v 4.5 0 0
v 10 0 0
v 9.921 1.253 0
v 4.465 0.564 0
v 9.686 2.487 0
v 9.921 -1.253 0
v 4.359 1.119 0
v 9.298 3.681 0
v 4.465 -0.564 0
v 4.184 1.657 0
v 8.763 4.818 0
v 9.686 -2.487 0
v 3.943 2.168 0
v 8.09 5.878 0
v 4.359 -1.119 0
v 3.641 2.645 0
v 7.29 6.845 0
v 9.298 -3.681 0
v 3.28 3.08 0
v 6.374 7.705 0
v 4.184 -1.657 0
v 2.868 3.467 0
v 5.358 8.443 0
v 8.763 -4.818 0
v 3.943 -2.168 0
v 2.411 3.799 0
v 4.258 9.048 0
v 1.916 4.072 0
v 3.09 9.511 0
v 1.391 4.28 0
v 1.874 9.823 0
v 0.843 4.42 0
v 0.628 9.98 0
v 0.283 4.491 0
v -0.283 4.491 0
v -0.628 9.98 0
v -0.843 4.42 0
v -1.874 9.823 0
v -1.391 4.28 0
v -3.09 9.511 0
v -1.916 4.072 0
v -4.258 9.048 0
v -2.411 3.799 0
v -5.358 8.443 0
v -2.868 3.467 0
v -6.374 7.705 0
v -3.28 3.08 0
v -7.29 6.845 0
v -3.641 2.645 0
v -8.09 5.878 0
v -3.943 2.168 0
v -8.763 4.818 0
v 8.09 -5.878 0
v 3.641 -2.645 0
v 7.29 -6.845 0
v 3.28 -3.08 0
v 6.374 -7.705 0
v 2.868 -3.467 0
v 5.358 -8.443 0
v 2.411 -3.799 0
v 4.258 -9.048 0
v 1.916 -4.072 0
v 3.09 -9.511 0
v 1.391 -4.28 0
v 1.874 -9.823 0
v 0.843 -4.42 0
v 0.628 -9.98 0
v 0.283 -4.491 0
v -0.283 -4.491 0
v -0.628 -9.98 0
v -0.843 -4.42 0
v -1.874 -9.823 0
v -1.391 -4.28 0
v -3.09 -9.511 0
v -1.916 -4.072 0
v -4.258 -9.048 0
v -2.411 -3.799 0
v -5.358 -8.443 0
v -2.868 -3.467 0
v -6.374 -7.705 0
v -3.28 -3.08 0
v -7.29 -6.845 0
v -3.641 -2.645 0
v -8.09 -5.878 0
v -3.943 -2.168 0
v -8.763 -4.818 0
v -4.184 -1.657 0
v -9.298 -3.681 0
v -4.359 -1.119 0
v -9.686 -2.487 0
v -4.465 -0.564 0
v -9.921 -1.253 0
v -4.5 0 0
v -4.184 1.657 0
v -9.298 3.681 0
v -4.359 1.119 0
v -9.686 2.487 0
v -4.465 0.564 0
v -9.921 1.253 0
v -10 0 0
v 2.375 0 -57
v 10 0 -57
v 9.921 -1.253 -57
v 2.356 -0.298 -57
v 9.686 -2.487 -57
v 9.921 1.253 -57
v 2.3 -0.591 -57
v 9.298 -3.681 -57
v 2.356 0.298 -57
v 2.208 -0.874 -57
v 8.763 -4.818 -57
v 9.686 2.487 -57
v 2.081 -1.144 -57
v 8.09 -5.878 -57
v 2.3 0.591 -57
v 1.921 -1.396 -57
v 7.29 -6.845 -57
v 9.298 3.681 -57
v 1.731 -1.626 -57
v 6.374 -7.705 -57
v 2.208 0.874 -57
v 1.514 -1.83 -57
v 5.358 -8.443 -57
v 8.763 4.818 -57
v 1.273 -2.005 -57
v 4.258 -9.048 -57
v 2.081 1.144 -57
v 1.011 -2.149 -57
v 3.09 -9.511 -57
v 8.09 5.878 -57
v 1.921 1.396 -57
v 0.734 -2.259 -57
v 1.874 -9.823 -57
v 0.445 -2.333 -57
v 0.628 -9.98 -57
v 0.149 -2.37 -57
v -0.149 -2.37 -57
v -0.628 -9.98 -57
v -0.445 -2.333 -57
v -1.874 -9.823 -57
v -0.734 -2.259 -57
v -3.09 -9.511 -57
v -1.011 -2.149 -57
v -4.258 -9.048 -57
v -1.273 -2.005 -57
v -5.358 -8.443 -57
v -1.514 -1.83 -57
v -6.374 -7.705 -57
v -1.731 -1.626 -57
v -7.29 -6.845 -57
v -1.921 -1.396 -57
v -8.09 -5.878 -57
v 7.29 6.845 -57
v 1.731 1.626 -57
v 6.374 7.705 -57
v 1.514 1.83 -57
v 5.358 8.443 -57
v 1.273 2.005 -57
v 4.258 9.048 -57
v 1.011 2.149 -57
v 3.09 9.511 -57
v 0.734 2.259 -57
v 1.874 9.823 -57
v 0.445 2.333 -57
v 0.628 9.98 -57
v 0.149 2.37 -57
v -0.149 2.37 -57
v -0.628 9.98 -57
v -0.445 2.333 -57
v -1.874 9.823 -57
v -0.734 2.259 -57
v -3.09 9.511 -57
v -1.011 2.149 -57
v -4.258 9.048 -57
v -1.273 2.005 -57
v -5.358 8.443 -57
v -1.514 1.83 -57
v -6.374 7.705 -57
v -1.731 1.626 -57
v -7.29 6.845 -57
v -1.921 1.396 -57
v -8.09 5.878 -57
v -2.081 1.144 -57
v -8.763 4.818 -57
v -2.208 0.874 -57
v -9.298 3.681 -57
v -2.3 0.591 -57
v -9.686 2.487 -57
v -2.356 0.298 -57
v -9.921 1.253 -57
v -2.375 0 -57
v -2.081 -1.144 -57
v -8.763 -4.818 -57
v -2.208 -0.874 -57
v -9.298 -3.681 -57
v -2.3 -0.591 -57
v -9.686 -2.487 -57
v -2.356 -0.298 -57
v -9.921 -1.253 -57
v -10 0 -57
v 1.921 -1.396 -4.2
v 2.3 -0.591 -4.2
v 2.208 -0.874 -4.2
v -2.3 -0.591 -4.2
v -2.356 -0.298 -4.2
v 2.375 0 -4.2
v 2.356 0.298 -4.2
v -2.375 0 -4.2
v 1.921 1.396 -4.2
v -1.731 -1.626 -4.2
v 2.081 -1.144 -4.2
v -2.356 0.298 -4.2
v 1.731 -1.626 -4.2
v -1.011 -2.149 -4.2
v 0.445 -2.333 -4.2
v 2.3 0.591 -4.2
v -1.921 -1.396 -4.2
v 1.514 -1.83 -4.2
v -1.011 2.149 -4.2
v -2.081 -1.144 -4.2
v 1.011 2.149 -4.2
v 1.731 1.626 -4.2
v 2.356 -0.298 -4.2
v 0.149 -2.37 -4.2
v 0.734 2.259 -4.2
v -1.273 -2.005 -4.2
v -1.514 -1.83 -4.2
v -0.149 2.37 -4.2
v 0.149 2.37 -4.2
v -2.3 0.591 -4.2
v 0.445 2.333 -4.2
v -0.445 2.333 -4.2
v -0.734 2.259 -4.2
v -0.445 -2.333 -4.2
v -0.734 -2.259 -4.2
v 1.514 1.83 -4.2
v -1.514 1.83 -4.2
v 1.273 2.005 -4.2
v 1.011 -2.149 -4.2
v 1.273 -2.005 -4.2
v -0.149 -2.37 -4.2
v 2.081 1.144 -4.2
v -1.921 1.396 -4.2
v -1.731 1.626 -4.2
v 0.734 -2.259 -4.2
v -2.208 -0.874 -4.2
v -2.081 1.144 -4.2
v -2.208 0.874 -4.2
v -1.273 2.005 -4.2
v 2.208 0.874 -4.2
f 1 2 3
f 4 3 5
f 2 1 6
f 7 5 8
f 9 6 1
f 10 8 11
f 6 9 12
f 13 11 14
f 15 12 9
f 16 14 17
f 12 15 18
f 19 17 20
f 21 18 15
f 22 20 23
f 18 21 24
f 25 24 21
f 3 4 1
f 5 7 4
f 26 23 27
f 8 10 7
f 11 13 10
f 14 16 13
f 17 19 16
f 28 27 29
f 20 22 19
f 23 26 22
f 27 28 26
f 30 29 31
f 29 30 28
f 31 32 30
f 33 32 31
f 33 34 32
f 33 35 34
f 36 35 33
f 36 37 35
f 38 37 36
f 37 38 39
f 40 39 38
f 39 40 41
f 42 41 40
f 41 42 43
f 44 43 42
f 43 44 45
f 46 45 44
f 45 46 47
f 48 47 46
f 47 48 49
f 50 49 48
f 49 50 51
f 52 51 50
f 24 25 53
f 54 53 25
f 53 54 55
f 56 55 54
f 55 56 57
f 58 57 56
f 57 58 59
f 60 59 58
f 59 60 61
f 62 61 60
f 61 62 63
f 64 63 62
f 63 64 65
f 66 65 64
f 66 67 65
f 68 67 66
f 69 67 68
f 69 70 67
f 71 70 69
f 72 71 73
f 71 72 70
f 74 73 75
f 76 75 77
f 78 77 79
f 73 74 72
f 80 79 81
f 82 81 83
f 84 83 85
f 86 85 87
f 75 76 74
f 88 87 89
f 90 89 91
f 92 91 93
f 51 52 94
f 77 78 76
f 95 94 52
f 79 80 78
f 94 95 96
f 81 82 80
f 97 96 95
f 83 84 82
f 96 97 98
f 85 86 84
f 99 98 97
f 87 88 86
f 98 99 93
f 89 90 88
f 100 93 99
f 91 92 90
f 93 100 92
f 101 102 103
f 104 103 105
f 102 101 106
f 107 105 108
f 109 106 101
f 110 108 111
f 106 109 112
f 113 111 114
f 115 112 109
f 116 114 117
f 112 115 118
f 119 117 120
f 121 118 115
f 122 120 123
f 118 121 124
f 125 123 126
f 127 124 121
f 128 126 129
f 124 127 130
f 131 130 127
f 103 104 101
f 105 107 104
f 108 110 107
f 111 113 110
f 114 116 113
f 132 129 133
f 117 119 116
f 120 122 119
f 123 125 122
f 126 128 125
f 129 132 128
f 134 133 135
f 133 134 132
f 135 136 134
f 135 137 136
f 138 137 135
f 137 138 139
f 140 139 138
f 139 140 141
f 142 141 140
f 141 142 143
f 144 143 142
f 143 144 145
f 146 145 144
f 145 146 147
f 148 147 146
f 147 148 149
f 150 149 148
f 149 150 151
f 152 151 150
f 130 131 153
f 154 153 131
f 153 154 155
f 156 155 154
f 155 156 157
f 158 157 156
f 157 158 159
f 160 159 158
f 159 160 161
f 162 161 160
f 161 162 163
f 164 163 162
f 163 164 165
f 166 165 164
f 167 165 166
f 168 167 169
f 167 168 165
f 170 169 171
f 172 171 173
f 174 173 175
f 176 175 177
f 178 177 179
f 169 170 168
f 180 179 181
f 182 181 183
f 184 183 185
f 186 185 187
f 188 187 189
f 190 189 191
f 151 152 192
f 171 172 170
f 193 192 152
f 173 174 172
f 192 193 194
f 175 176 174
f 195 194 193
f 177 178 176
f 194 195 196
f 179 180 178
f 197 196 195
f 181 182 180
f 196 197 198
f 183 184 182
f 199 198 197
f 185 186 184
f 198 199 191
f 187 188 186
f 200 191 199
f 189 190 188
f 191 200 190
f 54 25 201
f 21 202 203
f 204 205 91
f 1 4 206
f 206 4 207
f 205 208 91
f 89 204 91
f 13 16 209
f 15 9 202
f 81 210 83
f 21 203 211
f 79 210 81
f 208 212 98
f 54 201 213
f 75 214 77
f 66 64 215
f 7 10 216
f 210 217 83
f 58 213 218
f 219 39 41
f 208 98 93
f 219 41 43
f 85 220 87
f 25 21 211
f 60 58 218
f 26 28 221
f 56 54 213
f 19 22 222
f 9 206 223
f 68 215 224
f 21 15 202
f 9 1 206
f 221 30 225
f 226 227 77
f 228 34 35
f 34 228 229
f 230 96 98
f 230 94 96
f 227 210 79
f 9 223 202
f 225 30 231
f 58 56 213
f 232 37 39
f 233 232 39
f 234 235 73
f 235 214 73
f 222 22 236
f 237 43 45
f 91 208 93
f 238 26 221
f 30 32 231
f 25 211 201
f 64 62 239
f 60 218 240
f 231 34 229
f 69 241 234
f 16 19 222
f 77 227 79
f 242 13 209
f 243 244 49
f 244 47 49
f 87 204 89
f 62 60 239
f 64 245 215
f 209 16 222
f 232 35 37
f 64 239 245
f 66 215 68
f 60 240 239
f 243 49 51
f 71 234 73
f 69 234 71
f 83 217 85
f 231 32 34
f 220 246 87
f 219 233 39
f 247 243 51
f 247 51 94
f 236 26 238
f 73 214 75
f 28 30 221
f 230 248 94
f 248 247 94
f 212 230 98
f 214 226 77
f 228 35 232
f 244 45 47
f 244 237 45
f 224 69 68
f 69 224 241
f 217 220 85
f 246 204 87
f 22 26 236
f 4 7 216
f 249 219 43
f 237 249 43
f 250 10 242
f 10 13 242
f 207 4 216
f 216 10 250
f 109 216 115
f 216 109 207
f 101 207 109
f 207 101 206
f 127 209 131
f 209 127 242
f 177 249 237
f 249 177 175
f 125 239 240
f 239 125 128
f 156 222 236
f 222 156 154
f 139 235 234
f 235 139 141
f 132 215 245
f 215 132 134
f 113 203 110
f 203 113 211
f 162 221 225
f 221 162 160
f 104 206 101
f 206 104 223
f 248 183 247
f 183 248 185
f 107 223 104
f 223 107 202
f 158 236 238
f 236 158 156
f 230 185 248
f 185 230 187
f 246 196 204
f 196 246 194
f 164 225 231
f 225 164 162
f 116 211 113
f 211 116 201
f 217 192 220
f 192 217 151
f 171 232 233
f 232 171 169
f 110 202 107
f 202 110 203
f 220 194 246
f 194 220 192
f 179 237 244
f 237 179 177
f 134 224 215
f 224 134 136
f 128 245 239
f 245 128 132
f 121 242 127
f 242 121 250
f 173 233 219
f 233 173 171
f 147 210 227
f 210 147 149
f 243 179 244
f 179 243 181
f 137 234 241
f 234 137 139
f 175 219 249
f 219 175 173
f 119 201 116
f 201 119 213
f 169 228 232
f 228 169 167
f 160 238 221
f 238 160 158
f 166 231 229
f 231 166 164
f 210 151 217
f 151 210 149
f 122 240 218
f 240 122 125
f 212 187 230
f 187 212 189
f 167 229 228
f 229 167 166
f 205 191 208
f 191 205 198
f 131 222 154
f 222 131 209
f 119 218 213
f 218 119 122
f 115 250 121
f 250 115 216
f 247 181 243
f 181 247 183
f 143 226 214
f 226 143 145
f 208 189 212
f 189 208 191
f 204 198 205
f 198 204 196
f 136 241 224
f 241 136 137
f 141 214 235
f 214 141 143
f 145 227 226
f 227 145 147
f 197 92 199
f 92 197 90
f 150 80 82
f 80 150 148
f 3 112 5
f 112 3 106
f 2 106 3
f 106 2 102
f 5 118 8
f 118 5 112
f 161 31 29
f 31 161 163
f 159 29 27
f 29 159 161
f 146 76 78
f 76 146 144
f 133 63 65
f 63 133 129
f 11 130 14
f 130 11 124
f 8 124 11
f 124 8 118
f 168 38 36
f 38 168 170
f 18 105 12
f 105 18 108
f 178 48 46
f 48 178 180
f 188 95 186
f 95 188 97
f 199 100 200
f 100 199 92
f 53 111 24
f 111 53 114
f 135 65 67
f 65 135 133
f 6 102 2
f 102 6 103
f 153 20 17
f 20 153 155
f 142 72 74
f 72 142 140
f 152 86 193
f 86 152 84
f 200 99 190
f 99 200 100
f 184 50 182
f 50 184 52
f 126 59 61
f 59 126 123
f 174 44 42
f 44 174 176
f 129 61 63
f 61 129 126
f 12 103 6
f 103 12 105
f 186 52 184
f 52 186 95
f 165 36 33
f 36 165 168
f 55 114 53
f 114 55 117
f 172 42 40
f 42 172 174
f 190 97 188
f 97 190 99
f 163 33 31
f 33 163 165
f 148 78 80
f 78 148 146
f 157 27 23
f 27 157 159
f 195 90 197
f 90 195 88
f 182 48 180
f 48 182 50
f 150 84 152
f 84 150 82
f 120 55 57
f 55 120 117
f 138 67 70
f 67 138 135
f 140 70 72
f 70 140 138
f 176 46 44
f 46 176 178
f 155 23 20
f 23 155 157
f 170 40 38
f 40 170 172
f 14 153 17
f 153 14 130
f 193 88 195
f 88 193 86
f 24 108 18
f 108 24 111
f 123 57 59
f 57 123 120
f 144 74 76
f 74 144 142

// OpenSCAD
$fn = 50;


difference() {
	union() {
		translate(v = [0, 0, -57.0000000000]) {
			cylinder(h = 57, r = 10.0000000000);
		}
		cylinder(h = 0, r = 20.0000000000);
	}
	union() {
		translate(v = [0, 0, 0]) {
			rotate(a = [0, 0, 0]) {
				difference() {
					union() {
						#translate(v = [0, 0, -57.0000000000]) {
							cylinder(h = 57, r = 2.2500000000);
						}
						#translate(v = [0, 0, -4.2000000000]) {
							cylinder(h = 4.2000000000, r1 = 2.3750000000, r2 = 4.5000000000);
						}
						#translate(v = [0, 0, -57.0000000000]) {
							cylinder(h = 57, r = 2.3750000000);
						}
						#translate(v = [0, 0, -57.0000000000]) {
							cylinder(h = 57, r = 2.2500000000);
						}
					}
					union();
				}
			}
		}
	}
}
